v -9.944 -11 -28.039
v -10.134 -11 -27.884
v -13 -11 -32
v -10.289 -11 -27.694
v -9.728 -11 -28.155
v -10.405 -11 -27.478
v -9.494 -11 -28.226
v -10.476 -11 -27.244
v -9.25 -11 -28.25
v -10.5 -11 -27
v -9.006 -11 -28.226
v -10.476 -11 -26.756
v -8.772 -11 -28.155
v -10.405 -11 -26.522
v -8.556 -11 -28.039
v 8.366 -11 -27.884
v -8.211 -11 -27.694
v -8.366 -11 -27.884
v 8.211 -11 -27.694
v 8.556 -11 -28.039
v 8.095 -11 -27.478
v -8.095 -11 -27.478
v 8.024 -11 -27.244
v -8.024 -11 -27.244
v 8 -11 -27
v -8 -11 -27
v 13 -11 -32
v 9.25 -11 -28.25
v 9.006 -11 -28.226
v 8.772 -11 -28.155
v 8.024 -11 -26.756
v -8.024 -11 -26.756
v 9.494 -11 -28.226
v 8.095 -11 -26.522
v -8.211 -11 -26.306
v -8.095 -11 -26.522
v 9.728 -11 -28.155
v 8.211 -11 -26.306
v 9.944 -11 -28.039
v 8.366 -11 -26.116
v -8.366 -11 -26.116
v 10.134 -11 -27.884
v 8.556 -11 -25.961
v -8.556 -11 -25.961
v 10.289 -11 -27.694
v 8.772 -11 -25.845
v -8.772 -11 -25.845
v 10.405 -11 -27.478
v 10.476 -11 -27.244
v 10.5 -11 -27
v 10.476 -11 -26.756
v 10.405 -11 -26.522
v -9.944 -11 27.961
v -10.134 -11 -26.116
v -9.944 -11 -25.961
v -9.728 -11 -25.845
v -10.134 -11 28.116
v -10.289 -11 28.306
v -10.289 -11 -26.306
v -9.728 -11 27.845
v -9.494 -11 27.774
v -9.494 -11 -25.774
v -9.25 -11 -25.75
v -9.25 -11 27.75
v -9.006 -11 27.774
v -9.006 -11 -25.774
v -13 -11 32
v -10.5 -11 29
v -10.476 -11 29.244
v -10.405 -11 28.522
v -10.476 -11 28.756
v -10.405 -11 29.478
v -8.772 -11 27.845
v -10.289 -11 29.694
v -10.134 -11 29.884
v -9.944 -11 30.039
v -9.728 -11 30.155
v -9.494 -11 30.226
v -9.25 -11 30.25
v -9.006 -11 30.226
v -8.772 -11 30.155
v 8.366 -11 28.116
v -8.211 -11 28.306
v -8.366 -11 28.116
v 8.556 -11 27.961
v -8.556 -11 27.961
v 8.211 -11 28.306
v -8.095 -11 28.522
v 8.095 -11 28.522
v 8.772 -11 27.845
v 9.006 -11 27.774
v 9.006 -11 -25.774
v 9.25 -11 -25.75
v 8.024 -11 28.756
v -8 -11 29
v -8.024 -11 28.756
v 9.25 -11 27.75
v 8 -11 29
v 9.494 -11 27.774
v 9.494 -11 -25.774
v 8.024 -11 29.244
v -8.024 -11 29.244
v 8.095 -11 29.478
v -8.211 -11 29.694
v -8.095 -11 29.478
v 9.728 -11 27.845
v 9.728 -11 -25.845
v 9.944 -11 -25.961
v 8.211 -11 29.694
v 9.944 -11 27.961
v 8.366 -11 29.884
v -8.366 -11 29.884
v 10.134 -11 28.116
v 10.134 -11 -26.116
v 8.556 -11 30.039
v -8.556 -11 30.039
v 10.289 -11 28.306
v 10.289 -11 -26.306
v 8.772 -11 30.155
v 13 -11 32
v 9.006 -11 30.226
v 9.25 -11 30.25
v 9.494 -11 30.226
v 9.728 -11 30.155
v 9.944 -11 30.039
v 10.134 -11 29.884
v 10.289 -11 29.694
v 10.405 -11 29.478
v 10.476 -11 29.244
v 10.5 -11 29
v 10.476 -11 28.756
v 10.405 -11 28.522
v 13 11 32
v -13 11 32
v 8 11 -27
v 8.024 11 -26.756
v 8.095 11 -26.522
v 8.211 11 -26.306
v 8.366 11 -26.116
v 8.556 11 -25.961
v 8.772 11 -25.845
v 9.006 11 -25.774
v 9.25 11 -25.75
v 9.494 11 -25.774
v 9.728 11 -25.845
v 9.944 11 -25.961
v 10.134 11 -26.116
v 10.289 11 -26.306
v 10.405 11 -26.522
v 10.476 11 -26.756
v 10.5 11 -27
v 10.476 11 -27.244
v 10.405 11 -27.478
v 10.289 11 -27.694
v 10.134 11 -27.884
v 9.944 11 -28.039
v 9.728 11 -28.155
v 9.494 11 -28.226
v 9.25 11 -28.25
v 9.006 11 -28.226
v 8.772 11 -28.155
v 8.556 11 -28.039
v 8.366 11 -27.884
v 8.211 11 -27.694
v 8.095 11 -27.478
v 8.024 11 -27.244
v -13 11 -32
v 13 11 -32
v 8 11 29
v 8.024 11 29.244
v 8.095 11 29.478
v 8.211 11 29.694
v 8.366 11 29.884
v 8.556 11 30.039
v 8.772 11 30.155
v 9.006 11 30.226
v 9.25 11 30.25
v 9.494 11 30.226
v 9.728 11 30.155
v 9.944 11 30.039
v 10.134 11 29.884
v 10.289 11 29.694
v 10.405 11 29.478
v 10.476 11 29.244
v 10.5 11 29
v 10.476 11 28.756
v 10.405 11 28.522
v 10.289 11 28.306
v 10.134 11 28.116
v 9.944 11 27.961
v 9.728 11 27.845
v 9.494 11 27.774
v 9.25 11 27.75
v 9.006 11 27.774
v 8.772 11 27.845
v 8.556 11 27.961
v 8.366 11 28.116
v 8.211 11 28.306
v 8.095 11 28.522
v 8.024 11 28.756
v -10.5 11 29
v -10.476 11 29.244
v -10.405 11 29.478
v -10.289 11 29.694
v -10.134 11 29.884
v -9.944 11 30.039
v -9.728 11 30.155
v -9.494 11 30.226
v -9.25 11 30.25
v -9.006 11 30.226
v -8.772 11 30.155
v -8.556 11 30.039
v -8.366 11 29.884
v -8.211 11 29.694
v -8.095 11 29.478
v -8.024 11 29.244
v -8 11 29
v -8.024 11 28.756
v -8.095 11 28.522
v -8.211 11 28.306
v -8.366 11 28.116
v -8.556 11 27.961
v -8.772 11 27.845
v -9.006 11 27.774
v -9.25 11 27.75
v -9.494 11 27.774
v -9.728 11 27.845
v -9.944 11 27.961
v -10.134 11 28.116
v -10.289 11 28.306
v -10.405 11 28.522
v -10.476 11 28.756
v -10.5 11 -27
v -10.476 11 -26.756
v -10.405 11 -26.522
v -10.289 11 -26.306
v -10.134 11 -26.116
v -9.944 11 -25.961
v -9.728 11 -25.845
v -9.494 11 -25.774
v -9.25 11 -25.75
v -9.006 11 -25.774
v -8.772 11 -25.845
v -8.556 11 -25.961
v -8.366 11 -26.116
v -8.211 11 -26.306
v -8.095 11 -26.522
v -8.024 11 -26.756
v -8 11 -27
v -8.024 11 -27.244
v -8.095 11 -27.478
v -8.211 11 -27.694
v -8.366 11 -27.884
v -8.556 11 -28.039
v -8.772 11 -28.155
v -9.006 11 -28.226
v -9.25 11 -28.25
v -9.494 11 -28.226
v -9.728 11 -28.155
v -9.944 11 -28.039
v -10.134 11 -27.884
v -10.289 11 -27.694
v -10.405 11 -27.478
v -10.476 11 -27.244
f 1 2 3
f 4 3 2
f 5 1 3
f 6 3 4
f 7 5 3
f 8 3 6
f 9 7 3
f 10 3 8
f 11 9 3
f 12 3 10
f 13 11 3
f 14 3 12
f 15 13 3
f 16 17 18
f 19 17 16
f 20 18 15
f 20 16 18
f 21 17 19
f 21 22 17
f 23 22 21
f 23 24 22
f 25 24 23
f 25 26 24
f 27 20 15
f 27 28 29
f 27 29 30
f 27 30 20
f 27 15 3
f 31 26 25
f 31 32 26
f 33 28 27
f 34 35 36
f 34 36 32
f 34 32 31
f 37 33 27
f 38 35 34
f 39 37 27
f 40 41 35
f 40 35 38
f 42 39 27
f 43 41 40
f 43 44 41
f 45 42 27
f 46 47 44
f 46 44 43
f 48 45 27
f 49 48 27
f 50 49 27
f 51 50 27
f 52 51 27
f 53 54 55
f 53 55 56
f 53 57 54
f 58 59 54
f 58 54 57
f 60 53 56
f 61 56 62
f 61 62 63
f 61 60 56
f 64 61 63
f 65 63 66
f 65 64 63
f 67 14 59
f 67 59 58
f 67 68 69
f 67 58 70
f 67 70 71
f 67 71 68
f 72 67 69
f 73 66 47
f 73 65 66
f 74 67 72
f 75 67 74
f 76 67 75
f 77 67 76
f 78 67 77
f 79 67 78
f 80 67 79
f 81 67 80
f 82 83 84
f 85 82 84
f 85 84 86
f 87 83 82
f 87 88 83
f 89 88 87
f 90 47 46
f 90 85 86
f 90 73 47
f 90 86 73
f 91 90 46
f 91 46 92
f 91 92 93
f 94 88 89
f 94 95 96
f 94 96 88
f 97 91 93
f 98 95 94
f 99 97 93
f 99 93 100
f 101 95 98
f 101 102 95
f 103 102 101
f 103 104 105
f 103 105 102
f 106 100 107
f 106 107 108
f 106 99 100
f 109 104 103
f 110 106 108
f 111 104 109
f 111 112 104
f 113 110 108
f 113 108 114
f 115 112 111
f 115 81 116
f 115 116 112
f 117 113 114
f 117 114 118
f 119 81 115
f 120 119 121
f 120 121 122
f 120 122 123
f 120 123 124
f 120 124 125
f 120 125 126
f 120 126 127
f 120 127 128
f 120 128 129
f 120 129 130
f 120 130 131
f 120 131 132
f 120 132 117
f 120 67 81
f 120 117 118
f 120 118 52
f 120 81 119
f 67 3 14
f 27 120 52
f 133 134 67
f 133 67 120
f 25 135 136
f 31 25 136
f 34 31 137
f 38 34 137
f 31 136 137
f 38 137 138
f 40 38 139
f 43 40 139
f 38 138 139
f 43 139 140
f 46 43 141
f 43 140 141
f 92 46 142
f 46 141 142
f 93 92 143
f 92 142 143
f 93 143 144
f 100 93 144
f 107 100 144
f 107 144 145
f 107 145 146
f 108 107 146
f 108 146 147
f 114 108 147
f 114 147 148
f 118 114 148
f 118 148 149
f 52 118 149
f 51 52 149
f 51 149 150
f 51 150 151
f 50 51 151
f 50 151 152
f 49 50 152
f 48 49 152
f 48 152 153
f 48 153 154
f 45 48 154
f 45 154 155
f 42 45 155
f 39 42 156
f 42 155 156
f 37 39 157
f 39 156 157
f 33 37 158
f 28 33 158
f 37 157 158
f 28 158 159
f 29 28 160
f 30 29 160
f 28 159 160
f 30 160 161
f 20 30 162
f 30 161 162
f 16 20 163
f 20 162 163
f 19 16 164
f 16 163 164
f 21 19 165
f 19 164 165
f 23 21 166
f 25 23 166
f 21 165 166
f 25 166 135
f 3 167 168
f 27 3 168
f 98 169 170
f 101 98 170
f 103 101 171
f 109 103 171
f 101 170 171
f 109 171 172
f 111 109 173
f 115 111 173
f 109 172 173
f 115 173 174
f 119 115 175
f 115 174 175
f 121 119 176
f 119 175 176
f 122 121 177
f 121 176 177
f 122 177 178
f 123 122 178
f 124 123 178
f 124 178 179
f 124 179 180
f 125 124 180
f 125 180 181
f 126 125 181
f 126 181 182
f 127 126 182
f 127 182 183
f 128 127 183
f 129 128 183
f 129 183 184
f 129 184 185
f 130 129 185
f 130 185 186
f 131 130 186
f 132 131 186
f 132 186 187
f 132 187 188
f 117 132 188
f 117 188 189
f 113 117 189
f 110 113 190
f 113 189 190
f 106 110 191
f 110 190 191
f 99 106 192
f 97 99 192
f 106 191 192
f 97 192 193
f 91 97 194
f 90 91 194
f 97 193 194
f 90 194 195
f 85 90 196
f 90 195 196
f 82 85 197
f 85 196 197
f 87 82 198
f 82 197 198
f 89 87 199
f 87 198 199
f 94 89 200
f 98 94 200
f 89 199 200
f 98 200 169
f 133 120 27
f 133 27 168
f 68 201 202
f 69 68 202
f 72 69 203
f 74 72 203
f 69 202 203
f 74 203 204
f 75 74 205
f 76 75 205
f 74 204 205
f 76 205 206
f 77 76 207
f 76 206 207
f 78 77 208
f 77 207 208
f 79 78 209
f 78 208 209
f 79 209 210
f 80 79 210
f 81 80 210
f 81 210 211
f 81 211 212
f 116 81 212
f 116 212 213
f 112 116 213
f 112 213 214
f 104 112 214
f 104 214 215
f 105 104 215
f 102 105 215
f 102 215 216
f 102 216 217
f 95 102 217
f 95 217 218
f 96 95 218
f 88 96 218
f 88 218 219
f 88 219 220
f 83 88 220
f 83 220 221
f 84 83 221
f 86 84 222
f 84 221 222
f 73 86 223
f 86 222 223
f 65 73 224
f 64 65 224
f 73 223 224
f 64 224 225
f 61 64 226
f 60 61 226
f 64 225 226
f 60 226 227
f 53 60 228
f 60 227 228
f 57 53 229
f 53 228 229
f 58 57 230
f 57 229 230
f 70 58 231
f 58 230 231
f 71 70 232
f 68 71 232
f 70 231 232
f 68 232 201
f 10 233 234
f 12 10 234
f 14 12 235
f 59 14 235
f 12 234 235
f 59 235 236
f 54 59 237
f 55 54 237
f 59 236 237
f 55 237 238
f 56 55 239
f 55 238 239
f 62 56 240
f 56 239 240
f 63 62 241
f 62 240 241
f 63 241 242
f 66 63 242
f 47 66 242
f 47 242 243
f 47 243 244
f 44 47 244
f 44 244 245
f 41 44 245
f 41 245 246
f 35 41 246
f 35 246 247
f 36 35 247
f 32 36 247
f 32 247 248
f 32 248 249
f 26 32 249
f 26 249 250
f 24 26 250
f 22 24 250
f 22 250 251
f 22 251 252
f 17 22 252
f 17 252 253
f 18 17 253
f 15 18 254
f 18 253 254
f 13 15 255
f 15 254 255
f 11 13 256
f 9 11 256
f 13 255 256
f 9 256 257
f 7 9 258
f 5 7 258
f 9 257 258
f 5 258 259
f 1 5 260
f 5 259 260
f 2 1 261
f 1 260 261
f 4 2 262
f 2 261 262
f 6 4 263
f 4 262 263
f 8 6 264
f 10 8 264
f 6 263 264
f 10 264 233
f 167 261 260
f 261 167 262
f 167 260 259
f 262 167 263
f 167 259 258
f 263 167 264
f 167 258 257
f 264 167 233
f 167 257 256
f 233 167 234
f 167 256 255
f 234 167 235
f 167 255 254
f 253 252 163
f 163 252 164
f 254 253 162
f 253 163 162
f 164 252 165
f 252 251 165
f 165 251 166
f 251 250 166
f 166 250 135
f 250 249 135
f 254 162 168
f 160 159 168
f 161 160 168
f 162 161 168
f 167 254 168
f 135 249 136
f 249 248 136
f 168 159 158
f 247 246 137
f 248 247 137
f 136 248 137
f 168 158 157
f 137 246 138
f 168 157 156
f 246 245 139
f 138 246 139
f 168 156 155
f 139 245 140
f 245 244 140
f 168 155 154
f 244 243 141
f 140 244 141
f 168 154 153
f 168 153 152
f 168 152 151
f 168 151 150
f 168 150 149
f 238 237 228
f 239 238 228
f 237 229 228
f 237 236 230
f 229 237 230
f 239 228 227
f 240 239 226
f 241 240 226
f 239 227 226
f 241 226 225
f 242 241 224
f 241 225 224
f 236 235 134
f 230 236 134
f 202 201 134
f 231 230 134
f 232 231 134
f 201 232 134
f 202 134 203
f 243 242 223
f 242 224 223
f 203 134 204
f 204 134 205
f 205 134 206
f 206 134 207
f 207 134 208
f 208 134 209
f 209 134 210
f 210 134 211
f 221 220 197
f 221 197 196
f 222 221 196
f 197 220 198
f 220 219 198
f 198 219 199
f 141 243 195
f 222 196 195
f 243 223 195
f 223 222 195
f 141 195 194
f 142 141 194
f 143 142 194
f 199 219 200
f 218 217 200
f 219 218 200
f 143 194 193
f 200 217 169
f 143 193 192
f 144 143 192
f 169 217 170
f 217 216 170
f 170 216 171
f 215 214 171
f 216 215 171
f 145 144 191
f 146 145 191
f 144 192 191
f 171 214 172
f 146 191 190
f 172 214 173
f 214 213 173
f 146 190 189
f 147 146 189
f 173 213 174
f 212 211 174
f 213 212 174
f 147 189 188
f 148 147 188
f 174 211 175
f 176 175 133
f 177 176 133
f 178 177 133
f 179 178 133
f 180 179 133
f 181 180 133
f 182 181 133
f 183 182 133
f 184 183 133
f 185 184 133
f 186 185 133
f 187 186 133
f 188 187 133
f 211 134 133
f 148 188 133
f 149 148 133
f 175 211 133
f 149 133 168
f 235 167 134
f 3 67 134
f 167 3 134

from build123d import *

# Parameters (mm, degrees)
SKETCH_1_W          = 26
SKETCH_1_H          = 22
EXTRUDE_1_DEPTH     = 32
SKETCH_2_R          = 1.25
CUT_EXTRUDE_1_DEPTH = 40


with BuildPart() as part:
    # 草图1 → 凸台-拉伸1 (new, symmetric)
    with BuildSketch(Plane.XY):
        Rectangle(SKETCH_1_W, SKETCH_1_H)
    extrude(amount=EXTRUDE_1_DEPTH, both=True)

    # 草图2 → 切除-拉伸1 (cut)
    with BuildSketch(Plane(origin=(0, 11, 0), x_dir=(1, 0, 0), z_dir=(0, 1, 0))):
        with Locations(Location((9.25, -29, 0), (0, 0, 180))):
            Circle(SKETCH_2_R)
        with Locations(Location((9.25, 27, 0), (0, 0, 180))):
            Circle(SKETCH_2_R)
        with Locations(Location((-9.25, 27, 0), (0, 0, 180))):
            Circle(SKETCH_2_R)
        with Locations(Location((-9.25, -29, 0), (0, 0, 180))):
            Circle(SKETCH_2_R)
    extrude(amount=-CUT_EXTRUDE_1_DEPTH, mode=Mode.SUBTRACT)


solid = part.part
